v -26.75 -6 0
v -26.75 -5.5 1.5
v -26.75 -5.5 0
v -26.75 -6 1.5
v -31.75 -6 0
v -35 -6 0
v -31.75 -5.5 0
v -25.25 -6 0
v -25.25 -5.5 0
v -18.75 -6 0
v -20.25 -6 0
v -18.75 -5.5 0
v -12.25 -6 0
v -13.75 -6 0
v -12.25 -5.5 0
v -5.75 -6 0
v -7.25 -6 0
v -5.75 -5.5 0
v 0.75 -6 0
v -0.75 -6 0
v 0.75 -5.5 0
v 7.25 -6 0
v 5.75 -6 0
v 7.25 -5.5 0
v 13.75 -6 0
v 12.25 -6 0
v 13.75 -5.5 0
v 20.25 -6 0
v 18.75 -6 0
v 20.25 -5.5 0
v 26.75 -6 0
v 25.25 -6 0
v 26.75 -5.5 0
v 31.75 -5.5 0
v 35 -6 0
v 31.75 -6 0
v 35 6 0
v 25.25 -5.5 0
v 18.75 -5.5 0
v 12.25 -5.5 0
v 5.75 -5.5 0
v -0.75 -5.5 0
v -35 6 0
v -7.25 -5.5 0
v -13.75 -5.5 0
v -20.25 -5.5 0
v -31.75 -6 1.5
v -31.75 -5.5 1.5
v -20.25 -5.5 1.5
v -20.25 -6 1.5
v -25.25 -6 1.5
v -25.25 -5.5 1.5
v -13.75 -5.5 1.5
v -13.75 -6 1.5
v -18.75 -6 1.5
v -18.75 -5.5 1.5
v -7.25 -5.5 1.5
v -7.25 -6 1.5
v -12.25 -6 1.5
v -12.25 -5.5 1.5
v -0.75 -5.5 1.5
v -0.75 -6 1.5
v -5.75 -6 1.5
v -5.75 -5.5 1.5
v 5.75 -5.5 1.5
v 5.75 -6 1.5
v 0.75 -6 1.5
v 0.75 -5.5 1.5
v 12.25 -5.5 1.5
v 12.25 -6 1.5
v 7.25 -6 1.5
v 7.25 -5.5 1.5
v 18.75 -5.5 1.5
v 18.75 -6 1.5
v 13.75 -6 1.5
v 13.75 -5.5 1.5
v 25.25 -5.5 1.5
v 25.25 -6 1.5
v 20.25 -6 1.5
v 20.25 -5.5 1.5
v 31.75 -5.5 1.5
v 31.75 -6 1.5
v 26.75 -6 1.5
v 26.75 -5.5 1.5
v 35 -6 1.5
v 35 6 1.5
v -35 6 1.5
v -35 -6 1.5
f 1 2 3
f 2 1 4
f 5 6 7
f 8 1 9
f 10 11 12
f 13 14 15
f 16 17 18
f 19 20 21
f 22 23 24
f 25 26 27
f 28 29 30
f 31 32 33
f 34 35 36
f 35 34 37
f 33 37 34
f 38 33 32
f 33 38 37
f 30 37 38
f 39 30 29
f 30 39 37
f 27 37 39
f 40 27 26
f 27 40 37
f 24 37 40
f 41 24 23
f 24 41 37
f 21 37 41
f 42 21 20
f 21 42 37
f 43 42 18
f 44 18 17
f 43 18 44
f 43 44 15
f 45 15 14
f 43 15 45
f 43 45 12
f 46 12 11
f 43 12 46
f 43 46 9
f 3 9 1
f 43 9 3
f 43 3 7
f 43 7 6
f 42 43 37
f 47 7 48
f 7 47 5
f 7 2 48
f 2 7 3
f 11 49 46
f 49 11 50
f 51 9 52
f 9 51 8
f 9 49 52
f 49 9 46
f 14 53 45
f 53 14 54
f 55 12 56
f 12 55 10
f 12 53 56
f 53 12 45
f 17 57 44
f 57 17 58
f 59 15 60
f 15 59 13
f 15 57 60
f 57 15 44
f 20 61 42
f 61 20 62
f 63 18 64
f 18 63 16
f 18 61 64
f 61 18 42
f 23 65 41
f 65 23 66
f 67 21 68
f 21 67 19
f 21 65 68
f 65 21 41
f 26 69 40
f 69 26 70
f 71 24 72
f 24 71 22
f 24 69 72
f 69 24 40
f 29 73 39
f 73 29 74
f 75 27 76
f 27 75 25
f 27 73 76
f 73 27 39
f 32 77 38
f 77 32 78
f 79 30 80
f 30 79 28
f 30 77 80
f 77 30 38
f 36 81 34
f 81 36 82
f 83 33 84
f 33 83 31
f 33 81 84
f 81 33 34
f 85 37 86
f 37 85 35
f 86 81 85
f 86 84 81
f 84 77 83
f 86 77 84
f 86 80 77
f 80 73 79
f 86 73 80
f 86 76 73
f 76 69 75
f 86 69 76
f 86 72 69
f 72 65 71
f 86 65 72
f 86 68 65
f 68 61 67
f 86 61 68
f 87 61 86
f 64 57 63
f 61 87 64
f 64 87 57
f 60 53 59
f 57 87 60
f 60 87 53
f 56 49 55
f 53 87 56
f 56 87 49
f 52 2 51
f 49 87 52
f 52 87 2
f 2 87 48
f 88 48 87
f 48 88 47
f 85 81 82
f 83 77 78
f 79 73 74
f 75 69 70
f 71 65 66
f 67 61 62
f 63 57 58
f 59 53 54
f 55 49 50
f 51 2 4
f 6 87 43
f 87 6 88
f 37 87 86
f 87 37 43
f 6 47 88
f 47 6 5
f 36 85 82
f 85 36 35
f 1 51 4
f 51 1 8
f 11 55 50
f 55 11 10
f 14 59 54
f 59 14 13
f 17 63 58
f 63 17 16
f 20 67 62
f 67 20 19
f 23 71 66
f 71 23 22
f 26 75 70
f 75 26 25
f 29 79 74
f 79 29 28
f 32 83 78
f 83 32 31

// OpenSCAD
// 10-well comb for agarose gel casting, printed lying flat
// Units: mm

// ---- Spine ----
spine_len   = 70;   // spine length along X
spine_wid   = 12;   // spine width along Y
plate_thk   = 1.5;  // plate thickness along Z

// ---- Teeth ----
tooth_count = 10;   // number of teeth
tooth_w     = 5.0;  // tooth width along X
tooth_len   = 12;   // tooth length along Y (overlaps spine)
gap         = 1.5;  // gap between neighbouring teeth

// ---- Misc ----
eps         = 0.5;  // cutter overshoot past faces
$fn         = 64;

// Derived
pitch   = tooth_w + gap;
x_start = -(tooth_count - 1) * pitch / 2;  // first tooth centre X

difference() {
    // Base plate
    translate([-spine_len / 2, -spine_wid / 2, 0])
        cube([spine_len, spine_wid, plate_thk]);

    // Teeth hanging in -Y
    for (i = [0 : tooth_count - 1]) {
        translate([x_start + i * pitch - tooth_w / 2,
                   -spine_wid / 2 - tooth_len,
                   0])
            cube([tooth_w, tooth_len + eps, plate_thk + eps]);
    }
}
